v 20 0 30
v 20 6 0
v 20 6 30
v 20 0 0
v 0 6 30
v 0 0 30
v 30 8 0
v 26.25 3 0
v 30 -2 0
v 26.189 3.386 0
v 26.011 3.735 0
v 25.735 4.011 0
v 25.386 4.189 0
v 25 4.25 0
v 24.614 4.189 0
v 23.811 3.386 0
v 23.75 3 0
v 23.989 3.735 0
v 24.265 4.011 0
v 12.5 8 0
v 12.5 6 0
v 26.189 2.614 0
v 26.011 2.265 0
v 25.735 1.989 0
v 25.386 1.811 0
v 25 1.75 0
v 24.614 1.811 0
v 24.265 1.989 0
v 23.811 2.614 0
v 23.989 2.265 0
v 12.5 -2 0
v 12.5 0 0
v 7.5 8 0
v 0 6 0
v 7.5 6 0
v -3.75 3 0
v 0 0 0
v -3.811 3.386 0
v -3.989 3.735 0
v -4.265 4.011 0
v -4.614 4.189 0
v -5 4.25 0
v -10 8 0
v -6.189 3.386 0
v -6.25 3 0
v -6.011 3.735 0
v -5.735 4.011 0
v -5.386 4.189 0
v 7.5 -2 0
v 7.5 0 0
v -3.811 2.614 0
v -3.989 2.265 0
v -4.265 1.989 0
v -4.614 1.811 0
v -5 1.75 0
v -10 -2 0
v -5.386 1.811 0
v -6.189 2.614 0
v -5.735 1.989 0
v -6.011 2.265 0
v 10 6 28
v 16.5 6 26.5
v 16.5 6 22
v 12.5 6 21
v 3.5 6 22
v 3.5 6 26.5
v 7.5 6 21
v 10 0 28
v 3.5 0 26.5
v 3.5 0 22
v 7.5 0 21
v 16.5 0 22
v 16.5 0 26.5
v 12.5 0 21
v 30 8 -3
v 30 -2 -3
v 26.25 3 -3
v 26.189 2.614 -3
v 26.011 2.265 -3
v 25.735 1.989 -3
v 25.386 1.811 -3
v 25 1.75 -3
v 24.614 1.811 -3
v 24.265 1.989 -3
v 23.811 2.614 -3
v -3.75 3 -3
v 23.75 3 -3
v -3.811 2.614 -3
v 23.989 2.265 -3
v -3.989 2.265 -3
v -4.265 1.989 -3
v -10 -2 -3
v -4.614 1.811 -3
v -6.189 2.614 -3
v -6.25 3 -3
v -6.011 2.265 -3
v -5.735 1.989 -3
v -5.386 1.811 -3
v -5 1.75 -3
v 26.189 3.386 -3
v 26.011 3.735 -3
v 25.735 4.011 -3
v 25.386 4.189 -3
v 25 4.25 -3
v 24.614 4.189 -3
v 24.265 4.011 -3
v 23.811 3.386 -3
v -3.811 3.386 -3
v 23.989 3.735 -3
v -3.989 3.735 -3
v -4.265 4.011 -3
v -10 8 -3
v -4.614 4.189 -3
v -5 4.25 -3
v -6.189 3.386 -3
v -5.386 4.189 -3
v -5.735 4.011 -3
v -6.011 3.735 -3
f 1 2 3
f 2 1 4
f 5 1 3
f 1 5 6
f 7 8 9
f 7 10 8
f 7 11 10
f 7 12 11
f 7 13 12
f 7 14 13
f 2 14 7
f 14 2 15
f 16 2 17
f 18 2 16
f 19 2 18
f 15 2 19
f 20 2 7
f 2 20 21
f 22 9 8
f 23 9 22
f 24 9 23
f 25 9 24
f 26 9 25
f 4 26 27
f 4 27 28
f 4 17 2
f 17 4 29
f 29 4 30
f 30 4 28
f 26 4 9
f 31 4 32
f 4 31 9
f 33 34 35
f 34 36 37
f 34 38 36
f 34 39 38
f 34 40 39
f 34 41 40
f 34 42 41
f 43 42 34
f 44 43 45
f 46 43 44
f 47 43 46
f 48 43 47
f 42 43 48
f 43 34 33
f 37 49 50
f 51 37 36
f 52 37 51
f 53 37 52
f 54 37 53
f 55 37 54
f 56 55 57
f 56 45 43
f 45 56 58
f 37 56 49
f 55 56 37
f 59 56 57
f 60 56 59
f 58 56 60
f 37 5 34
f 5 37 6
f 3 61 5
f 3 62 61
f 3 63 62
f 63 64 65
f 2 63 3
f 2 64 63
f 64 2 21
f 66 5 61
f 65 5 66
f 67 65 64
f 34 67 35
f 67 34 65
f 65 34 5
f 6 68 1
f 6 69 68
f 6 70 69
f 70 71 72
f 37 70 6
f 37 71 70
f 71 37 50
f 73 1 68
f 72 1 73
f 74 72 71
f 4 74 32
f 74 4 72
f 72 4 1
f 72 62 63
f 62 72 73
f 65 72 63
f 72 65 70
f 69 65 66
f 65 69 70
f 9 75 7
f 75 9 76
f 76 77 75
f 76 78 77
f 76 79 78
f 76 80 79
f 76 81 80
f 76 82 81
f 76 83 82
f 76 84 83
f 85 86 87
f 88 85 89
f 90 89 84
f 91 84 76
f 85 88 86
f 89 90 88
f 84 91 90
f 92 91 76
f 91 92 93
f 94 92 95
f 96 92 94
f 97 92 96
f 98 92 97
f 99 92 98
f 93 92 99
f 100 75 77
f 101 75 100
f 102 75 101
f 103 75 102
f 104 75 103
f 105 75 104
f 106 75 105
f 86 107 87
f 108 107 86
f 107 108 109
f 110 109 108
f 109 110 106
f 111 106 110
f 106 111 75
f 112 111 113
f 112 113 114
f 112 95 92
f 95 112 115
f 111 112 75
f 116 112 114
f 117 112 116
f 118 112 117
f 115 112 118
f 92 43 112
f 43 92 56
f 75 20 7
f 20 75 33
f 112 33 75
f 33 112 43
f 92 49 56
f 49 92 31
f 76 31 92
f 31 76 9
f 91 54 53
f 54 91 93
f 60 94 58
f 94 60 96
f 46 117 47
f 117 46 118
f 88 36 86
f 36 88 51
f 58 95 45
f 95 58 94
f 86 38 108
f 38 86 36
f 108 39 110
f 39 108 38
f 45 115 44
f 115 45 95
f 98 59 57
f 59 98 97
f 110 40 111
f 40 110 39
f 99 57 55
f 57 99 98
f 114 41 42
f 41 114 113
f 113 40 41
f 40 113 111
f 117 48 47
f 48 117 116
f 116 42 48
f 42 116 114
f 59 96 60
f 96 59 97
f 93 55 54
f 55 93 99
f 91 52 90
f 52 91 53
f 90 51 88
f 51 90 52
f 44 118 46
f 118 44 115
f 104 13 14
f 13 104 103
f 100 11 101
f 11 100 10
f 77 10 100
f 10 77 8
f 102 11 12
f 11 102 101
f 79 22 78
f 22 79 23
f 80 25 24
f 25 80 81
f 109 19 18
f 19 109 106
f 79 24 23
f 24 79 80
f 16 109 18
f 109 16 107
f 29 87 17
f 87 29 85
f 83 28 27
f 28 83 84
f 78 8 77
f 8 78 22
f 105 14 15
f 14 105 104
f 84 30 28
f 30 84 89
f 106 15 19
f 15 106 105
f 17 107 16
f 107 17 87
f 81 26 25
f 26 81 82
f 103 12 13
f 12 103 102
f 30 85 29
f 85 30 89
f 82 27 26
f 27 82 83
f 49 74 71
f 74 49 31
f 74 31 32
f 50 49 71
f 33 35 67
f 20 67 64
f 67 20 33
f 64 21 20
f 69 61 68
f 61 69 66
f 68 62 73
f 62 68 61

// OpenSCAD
$fn=20;
height=30;
width=20;
depth=6;

union() {
	difference() {
		cube ([width, depth, height]);
		translate([3.5,-.1,height-8]) cube([13, 6.2, 6]);
	}
	difference() {
		translate([-10,-2,-3]) cube([40,10,3]);
		translate([-5,3,-3]) cylinder(d=2.5,h=3);
		translate([25,3,-3]) cylinder(d=2.5,h=3);
	}
	translate([7.5,0,0]) support();
	translate([12.5,6,0]) rotate([0,0,180]) support();
	translate([3.5,0,height-2]) rotate([90,0,90]) resize([6,1.5,6.5]) support();
	translate([16.5,6,height-2]) rotate([90,0,-90]) resize([6,1.5,6.5]) support();
}

module support()
{
	polyhedron(points=[[0,0,0],[0,0,height*.7],[5,0,height*.7],[5,0,0],[0,-2,0],[5,-2,0]],faces=[[0,3,2,1],[1,2,5,4],[0,1,4],[2,3,5],[0,4,5,3]]);
}
